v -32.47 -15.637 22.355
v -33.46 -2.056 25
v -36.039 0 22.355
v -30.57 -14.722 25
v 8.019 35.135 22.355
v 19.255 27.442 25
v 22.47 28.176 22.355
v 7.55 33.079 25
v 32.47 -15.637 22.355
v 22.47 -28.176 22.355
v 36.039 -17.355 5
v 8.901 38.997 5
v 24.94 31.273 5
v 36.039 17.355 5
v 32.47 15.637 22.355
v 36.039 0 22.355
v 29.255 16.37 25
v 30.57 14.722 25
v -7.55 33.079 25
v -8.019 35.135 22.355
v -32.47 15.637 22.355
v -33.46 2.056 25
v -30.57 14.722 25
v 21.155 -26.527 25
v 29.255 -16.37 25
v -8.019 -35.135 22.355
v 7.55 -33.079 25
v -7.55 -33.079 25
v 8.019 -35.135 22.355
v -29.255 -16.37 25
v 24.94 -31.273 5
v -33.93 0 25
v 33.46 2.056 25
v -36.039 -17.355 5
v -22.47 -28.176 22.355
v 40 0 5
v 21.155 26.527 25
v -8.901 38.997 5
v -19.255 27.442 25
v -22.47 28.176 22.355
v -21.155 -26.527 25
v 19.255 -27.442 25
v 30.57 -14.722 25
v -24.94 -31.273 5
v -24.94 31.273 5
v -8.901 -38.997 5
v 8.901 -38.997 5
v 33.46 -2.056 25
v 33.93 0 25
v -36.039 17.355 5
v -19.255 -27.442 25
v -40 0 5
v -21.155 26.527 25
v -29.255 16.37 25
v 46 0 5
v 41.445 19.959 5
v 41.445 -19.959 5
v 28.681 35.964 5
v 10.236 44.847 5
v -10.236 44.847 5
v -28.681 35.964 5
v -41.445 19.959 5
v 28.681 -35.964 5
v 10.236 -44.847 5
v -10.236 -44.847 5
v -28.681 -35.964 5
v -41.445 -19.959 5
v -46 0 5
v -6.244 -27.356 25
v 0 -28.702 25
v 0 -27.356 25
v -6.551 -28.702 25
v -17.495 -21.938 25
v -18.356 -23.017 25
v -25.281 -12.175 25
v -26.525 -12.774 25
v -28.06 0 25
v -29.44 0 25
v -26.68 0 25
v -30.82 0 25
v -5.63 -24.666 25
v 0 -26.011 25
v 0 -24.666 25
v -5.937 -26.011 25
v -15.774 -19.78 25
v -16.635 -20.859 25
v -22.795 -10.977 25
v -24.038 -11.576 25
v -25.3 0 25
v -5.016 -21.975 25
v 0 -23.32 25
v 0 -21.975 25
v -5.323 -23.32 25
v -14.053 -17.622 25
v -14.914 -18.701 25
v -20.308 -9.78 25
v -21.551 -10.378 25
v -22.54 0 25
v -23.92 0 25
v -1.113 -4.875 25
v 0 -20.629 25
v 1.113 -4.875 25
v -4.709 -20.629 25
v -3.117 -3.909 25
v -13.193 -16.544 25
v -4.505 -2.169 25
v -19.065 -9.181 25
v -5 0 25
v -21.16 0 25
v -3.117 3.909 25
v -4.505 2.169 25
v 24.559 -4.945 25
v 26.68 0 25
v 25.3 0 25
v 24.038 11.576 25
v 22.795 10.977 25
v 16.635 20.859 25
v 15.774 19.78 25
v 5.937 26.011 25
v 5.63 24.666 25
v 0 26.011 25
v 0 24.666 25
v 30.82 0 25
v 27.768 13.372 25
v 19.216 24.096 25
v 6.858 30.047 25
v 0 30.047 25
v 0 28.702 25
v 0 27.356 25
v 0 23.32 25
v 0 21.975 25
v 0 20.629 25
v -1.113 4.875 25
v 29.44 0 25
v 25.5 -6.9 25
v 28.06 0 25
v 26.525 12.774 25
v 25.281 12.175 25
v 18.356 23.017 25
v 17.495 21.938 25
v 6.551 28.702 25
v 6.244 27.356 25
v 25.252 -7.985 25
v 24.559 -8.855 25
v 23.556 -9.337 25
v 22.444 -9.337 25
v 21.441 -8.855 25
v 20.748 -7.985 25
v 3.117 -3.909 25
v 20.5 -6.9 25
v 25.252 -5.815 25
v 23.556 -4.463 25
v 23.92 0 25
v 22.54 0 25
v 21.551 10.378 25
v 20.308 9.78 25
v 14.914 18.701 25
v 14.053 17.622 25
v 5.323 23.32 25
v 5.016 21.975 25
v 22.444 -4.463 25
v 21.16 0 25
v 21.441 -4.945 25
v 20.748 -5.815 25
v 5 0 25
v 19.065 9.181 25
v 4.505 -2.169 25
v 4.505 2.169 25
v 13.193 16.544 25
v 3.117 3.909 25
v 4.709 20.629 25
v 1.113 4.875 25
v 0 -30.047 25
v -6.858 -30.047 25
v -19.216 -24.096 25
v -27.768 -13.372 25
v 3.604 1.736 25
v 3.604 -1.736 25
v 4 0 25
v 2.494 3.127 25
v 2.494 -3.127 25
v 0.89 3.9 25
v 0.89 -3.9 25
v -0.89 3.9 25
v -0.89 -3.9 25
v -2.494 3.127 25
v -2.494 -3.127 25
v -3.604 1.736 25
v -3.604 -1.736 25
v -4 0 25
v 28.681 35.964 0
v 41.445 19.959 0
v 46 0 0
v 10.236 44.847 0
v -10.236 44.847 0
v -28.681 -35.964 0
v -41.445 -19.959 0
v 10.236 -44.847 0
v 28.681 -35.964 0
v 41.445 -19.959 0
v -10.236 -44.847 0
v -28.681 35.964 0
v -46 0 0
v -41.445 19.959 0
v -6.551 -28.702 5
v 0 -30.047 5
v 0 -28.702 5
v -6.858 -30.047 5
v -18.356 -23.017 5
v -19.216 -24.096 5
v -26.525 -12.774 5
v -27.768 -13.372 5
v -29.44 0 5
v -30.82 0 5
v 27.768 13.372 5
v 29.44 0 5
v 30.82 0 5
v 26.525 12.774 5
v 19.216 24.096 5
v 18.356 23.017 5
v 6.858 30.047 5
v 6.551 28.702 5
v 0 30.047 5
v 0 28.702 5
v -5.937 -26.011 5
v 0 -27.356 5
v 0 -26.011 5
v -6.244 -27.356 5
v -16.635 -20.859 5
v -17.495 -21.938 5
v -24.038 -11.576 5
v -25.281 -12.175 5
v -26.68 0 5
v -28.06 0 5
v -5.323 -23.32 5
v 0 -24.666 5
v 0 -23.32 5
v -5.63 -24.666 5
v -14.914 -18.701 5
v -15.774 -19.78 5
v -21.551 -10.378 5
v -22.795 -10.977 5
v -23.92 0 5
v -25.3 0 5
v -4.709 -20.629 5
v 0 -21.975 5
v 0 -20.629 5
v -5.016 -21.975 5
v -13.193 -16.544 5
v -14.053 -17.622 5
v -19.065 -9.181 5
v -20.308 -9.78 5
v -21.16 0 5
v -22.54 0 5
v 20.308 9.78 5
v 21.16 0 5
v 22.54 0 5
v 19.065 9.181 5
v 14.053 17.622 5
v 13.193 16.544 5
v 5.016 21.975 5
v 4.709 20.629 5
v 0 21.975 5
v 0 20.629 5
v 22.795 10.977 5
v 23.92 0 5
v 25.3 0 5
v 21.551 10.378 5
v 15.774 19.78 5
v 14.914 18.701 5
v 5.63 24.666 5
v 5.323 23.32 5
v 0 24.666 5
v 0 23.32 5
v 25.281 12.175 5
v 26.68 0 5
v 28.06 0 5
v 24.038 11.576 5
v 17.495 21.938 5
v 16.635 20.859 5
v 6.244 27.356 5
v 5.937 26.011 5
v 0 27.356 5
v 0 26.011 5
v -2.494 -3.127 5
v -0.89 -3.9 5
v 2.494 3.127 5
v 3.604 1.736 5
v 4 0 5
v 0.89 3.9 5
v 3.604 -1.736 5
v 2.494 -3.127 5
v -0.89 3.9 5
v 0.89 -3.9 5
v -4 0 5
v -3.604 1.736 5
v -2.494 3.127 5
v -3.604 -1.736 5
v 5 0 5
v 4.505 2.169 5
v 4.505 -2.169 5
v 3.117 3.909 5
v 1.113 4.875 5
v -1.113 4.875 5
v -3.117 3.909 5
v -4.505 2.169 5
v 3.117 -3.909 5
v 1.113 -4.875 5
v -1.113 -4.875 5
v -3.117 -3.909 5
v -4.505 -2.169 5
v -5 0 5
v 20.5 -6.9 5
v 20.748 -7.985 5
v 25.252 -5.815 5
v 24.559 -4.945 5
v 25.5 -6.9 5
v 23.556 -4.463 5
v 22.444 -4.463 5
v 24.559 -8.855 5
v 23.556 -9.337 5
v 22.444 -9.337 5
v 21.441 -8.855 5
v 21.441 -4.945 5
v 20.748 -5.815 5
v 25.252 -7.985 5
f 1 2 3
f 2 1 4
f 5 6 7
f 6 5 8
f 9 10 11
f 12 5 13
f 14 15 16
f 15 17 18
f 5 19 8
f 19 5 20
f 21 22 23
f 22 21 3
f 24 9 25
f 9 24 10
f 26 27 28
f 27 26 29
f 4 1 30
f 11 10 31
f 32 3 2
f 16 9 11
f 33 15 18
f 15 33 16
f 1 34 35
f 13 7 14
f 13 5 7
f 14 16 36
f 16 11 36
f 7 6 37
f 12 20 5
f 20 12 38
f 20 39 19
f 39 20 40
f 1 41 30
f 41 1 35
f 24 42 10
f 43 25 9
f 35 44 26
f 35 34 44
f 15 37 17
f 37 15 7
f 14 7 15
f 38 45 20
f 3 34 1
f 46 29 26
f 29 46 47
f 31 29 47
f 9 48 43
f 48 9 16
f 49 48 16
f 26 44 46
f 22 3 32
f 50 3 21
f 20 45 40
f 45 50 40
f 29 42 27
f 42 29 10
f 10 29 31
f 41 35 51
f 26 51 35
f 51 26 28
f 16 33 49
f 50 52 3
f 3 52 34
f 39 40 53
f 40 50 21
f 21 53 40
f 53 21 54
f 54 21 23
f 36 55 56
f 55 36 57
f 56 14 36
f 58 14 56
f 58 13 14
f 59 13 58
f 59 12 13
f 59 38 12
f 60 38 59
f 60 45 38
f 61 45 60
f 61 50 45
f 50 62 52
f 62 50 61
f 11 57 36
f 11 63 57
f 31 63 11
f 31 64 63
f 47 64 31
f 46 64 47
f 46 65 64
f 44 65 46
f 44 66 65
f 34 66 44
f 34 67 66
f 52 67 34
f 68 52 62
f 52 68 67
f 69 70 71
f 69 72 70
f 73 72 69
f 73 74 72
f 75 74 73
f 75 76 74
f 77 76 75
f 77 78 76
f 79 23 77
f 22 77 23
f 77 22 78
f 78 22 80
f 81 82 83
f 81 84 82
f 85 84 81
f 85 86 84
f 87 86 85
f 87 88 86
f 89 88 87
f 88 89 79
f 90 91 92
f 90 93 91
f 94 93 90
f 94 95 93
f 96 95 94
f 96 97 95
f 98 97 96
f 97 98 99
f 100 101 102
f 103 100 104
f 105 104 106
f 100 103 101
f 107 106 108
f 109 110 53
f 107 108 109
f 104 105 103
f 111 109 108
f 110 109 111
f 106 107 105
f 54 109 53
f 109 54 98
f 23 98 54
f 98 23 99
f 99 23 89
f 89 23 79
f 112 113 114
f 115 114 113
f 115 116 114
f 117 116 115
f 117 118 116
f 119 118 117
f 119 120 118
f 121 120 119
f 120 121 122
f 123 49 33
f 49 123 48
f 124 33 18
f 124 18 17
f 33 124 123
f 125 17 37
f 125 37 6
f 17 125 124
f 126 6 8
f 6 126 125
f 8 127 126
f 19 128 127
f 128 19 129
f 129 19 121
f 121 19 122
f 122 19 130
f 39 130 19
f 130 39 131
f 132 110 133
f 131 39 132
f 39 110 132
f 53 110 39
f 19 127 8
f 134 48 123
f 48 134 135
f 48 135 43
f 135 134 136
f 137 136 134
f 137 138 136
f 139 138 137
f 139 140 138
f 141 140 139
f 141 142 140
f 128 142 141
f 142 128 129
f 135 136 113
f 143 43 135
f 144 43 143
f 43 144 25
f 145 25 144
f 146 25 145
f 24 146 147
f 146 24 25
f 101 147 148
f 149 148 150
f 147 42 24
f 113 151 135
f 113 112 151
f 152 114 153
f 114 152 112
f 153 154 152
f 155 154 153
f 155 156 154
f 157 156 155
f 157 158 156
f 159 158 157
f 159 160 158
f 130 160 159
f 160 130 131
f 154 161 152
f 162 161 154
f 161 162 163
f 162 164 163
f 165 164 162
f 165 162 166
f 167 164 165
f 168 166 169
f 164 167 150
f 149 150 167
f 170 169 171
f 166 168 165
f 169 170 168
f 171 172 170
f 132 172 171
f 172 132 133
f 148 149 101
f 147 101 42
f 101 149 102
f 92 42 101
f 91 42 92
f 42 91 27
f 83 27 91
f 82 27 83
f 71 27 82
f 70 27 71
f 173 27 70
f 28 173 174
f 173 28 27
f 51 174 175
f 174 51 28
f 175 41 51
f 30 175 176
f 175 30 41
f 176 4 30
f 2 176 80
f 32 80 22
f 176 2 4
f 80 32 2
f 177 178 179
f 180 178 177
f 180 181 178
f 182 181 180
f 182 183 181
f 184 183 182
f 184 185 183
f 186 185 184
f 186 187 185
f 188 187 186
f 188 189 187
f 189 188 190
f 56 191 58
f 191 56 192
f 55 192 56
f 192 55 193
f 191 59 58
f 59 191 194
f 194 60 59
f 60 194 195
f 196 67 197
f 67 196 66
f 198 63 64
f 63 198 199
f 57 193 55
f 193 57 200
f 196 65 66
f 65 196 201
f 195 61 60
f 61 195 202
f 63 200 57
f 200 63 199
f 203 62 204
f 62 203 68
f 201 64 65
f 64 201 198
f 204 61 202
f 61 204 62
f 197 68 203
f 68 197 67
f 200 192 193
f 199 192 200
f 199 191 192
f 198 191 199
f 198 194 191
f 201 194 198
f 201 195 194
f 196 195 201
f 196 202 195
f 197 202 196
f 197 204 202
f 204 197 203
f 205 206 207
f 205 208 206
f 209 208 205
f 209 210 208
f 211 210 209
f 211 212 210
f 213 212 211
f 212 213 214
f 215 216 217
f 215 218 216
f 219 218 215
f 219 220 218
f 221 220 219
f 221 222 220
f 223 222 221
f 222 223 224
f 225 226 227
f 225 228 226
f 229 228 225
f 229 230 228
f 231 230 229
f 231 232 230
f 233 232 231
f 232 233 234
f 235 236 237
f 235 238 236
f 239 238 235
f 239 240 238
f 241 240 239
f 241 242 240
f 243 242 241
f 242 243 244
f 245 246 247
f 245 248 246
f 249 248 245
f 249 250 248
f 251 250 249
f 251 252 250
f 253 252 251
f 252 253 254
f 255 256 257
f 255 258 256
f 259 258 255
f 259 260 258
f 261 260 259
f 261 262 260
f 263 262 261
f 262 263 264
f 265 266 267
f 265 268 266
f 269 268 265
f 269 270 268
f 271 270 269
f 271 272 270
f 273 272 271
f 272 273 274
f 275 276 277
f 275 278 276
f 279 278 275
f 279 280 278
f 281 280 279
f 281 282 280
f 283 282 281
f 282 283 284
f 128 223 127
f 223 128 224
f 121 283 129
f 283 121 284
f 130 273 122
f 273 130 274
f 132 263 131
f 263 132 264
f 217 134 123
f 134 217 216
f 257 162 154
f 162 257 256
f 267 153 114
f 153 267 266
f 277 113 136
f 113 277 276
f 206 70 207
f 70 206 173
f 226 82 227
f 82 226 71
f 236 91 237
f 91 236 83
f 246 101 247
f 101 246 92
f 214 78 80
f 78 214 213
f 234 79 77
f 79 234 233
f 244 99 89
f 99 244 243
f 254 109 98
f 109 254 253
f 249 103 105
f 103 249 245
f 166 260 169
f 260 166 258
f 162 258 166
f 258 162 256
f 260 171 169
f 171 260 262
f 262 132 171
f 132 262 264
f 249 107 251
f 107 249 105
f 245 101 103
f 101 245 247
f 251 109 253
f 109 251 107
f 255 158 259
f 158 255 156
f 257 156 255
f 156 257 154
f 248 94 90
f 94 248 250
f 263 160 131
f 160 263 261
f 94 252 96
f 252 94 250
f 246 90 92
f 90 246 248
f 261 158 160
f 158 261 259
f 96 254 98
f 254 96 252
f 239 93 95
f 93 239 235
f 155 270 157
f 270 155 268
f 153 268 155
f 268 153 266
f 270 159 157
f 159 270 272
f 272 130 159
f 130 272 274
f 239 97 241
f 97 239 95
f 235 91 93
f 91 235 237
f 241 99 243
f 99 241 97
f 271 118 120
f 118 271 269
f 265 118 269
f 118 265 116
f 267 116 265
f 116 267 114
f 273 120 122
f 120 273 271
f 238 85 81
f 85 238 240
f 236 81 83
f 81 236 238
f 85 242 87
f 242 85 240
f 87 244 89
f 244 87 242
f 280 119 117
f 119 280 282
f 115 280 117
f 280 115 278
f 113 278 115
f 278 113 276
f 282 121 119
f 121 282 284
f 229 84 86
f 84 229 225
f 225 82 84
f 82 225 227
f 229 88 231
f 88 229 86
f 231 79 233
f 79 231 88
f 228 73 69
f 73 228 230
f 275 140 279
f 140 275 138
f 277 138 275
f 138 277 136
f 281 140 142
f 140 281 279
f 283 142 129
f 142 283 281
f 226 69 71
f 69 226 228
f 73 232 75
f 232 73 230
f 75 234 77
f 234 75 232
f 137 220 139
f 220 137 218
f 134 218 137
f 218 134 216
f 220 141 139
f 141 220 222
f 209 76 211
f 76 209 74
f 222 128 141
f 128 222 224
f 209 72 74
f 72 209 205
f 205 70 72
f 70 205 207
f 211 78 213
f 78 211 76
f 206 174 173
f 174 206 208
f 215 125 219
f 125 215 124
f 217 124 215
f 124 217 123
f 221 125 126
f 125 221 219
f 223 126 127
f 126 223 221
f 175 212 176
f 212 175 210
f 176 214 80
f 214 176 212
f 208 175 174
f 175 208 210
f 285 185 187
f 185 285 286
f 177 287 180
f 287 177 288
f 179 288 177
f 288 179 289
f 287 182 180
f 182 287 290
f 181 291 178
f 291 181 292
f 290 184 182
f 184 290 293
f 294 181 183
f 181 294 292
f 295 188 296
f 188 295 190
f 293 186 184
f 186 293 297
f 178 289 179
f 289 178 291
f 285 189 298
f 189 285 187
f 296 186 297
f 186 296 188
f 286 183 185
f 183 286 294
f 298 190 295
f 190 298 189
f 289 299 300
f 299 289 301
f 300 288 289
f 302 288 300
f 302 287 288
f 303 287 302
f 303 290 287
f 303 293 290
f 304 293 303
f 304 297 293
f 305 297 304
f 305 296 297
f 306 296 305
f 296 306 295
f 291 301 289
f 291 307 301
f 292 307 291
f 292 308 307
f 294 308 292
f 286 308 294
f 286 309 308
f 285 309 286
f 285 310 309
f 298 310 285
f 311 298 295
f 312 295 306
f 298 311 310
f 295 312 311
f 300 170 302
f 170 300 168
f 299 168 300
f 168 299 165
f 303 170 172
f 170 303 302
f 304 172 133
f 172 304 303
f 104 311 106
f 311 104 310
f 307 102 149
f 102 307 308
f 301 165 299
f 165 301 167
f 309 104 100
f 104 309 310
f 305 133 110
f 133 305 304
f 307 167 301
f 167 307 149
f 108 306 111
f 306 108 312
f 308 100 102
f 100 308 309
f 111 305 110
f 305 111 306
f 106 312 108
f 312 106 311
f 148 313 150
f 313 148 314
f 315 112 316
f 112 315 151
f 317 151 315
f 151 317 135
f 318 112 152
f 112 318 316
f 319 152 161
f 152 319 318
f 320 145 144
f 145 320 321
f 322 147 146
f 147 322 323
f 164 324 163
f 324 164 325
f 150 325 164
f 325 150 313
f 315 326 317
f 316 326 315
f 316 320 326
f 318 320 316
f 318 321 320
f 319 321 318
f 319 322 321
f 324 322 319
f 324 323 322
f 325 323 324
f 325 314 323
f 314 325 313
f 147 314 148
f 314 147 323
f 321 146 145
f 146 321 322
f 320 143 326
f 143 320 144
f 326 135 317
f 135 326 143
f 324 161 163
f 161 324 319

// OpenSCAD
// file: lib.scad
module ConcentricCylinders (r, h, diff, depth = 0) {
  if (depth == 0) {
    cylinder(r=r, h=h);
  } else {
    difference() {
      cylinder(r=r, h=h);
      intersection() {
        translate([0, 0, -1])
        ConcentricCylinders(r=r-diff, h=h+2,
          diff=diff, depth=depth-1);
        cylinder(r=r, h=h);
      }
    }
  }
}
// main file
use <lib.scad>;

module SmokeDetector (r=46, h=25) {
  difference() {
    union () {
      translate([0, 0, 5])
      intersection () {
        sphere(r-6);
        cylinder(h=h*0.8, r=r-2);
      }
      cylinder(h=h*0.2, r=r);
    }
    translate([0, 0, h*0.2]) {
      intersection () {
        union() {
          cube(r);
          translate([-r, -r, 0]) cube(r);
        }
        ConcentricCylinders(r * 0.67, h, r*0.03 , 7);
      }
      ConcentricCylinders(5, h, 1, depth=1);
    }
    translate([r*0.5, -r*0.15, h*0.2])
    cylinder(h=h+1, d=5);
    
  }
}

$fn=14;
SmokeDetector();
